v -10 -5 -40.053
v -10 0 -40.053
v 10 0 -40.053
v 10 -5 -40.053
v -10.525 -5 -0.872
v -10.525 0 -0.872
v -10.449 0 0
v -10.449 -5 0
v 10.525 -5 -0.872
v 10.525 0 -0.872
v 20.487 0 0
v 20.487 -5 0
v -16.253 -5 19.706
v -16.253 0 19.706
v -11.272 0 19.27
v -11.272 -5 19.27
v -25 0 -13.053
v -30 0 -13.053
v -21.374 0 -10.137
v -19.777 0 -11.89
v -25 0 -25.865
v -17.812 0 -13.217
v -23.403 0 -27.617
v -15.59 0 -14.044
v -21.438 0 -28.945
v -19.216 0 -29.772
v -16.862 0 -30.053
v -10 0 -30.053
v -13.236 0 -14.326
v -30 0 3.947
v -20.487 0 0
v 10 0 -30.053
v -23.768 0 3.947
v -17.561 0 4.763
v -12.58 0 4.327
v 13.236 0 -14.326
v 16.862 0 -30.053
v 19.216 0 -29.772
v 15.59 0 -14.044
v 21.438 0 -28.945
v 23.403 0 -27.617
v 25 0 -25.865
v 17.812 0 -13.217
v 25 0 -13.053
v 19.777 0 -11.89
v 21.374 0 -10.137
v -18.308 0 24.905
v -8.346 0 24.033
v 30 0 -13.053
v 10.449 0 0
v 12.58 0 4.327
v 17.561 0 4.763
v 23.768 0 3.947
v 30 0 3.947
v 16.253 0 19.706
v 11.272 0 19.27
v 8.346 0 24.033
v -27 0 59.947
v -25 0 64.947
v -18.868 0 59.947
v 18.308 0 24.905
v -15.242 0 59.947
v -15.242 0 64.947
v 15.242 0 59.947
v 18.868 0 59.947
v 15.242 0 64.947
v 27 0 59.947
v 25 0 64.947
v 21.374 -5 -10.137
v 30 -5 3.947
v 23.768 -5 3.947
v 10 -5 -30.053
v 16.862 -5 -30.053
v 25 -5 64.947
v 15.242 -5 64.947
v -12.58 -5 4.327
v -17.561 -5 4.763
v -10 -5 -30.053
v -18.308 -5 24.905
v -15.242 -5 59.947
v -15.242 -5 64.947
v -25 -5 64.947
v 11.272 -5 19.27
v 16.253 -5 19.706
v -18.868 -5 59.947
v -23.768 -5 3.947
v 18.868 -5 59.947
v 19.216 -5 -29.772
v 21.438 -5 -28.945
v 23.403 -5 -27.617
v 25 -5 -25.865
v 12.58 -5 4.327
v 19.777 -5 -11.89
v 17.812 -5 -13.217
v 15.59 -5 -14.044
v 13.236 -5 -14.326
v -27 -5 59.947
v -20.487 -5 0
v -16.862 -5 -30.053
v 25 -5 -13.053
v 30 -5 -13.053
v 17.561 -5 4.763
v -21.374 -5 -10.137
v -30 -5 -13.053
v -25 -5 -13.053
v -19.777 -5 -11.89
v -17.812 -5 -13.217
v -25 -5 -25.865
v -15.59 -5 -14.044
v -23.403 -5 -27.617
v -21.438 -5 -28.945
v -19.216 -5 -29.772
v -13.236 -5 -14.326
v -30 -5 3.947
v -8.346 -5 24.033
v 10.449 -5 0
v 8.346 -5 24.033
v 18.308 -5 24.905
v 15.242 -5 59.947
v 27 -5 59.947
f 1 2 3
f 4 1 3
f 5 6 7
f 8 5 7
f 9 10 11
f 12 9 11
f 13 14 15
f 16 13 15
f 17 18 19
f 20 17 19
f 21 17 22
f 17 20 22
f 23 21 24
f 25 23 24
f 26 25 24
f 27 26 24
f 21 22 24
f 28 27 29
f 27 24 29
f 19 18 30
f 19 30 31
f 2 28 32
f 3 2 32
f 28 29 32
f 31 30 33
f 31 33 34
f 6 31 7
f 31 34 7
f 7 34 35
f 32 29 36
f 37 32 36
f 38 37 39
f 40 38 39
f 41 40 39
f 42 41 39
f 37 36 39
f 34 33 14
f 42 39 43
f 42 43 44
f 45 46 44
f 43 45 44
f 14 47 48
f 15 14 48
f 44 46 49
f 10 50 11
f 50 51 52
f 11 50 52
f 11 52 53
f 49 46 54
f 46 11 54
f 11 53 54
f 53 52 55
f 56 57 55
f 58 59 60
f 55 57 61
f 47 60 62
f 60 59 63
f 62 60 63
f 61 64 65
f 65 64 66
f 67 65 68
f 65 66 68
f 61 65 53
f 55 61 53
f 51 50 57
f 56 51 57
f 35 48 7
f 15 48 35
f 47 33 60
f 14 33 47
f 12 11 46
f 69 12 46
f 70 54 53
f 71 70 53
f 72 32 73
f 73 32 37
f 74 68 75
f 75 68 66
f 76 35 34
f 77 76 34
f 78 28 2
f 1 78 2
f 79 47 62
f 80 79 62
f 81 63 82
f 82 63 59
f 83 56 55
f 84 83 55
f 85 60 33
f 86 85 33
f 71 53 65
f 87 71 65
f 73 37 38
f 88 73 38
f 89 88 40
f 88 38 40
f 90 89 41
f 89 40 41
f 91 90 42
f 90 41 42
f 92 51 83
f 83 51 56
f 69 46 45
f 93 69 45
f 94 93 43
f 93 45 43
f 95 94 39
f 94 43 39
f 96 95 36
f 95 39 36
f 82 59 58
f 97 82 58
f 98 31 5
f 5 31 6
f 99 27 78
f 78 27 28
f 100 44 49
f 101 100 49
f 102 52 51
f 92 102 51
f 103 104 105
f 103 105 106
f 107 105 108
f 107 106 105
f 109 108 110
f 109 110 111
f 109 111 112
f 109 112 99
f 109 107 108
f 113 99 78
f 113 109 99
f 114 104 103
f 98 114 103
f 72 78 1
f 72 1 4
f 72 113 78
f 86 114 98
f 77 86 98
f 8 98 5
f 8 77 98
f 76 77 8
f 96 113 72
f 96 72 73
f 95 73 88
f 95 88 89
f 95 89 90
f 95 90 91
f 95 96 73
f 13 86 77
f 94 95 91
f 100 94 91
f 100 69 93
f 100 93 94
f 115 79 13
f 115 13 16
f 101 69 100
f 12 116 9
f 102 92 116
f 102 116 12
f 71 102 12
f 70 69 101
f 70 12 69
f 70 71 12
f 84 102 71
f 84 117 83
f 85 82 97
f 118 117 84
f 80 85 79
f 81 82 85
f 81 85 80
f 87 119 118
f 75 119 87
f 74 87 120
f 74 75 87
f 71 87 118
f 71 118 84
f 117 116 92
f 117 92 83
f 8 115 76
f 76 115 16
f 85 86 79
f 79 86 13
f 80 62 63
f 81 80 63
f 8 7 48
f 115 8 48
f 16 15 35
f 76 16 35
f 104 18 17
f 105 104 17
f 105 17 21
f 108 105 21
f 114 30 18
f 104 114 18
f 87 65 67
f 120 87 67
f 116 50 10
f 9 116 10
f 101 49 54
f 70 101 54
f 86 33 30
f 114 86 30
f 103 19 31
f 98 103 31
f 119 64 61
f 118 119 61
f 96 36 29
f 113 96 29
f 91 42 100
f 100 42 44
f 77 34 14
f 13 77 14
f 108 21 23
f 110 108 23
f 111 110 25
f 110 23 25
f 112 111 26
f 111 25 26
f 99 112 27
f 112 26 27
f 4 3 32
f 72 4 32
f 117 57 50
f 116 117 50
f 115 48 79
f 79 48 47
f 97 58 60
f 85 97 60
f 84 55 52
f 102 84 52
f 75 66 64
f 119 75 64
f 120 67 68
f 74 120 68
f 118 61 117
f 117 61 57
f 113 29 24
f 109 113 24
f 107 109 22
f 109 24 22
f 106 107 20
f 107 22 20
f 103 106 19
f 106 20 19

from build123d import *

# Parameters (mm, degrees)
F1_DEPTH = 5


with BuildPart() as f1:
    # F0 (on Front) → F1 (new body)
    with BuildSketch(Plane.XZ):
        with BuildLine():
            ThreePointArc((-25, -25.864711), (-21.438301, -28.944777), (-16.861899, -30.053402))
            Line((-16.861899, -30.053402), (-10, -30.053402))
            Line((-10, -30.053402), (-10, -40.053402))
            Line((-10, -40.053402), (10, -40.053402))
            Line((10, -40.053402), (10, -30.053402))
            Line((10, -30.053402), (16.861899, -30.053402))
            ThreePointArc((16.861899, -30.053402), (21.438301, -28.944777), (25, -25.864711))
            Line((25, -25.864711), (25, -13.053402))
            Line((25, -13.053402), (30, -13.053402))
            Line((30, -13.053402), (30, 3.946598))
            Line((30, 3.946598), (23.767857, 3.946598))
            Line((23.767857, 3.946598), (18.868492, 59.946598))
            Line((18.868492, 59.946598), (25, 59.946598))
            Line((25, 59.946598), (27, 59.946598))
            Line((27, 59.946598), (25, 64.946598))
            Line((25, 64.946598), (21, 64.946598))
            Line((21, 64.946598), (15.242257, 64.946598))
            Line((15.242257, 64.946598), (15.242257, 59.946598))
            Line((15.242257, 59.946598), (18.308011, 24.904867))
            Line((18.308011, 24.904867), (8.346064, 24.03331))
            Line((8.346064, 24.03331), (10.448706, 0))
            Line((10.448706, 0), (10.524957, -0.871557))
            Line((10.524957, -0.871557), (20.486904, 0))
            Line((20.486904, 0), (21.373765, -10.136863))
            ThreePointArc((21.373765, -10.136863), (17.812066, -13.216929), (13.235664, -14.325554))
            Line((13.235664, -14.325554), (-13.235664, -14.325554))
            ThreePointArc((-13.235664, -14.325554), (-17.812066, -13.216929), (-21.373765, -10.136863))
            Line((-21.373765, -10.136863), (-20.486904, 0))
            Line((-20.486904, 0), (-10.524957, -0.871557))
            Line((-10.524957, -0.871557), (-10.448706, 0))
            Line((-10.448706, 0), (-8.346064, 24.03331))
            Line((-8.346064, 24.03331), (-18.308011, 24.904867))
            Line((-18.308011, 24.904867), (-15.242257, 59.946598))
            Line((-15.242257, 59.946598), (-15.242257, 64.946598))
            Line((-15.242257, 64.946598), (-21, 64.946598))
            Line((-21, 64.946598), (-25, 64.946598))
            Line((-25, 64.946598), (-27, 59.946598))
            Line((-27, 59.946598), (-25, 59.946598))
            Line((-25, 59.946598), (-18.868492, 59.946598))
            Line((-18.868492, 59.946598), (-23.767857, 3.946598))
            Line((-23.767857, 3.946598), (-30, 3.946598))
            Line((-30, 3.946598), (-30, -13.053402))
            Line((-30, -13.053402), (-25, -13.053402))
            Line((-25, -13.053402), (-25, -25.864711))
        make_face()
        Polygon((-17.560639, 4.763084), (-16.253303, 19.706005), (-11.272329, 19.270226), (-12.579665, 4.327305), align=None, mode=Mode.SUBTRACT)
        Polygon((16.253303, 19.706005), (17.560639, 4.763084), (12.579665, 4.327305), (11.272329, 19.270226), align=None, mode=Mode.SUBTRACT)
    extrude(amount=F1_DEPTH)


solid = f1.part
